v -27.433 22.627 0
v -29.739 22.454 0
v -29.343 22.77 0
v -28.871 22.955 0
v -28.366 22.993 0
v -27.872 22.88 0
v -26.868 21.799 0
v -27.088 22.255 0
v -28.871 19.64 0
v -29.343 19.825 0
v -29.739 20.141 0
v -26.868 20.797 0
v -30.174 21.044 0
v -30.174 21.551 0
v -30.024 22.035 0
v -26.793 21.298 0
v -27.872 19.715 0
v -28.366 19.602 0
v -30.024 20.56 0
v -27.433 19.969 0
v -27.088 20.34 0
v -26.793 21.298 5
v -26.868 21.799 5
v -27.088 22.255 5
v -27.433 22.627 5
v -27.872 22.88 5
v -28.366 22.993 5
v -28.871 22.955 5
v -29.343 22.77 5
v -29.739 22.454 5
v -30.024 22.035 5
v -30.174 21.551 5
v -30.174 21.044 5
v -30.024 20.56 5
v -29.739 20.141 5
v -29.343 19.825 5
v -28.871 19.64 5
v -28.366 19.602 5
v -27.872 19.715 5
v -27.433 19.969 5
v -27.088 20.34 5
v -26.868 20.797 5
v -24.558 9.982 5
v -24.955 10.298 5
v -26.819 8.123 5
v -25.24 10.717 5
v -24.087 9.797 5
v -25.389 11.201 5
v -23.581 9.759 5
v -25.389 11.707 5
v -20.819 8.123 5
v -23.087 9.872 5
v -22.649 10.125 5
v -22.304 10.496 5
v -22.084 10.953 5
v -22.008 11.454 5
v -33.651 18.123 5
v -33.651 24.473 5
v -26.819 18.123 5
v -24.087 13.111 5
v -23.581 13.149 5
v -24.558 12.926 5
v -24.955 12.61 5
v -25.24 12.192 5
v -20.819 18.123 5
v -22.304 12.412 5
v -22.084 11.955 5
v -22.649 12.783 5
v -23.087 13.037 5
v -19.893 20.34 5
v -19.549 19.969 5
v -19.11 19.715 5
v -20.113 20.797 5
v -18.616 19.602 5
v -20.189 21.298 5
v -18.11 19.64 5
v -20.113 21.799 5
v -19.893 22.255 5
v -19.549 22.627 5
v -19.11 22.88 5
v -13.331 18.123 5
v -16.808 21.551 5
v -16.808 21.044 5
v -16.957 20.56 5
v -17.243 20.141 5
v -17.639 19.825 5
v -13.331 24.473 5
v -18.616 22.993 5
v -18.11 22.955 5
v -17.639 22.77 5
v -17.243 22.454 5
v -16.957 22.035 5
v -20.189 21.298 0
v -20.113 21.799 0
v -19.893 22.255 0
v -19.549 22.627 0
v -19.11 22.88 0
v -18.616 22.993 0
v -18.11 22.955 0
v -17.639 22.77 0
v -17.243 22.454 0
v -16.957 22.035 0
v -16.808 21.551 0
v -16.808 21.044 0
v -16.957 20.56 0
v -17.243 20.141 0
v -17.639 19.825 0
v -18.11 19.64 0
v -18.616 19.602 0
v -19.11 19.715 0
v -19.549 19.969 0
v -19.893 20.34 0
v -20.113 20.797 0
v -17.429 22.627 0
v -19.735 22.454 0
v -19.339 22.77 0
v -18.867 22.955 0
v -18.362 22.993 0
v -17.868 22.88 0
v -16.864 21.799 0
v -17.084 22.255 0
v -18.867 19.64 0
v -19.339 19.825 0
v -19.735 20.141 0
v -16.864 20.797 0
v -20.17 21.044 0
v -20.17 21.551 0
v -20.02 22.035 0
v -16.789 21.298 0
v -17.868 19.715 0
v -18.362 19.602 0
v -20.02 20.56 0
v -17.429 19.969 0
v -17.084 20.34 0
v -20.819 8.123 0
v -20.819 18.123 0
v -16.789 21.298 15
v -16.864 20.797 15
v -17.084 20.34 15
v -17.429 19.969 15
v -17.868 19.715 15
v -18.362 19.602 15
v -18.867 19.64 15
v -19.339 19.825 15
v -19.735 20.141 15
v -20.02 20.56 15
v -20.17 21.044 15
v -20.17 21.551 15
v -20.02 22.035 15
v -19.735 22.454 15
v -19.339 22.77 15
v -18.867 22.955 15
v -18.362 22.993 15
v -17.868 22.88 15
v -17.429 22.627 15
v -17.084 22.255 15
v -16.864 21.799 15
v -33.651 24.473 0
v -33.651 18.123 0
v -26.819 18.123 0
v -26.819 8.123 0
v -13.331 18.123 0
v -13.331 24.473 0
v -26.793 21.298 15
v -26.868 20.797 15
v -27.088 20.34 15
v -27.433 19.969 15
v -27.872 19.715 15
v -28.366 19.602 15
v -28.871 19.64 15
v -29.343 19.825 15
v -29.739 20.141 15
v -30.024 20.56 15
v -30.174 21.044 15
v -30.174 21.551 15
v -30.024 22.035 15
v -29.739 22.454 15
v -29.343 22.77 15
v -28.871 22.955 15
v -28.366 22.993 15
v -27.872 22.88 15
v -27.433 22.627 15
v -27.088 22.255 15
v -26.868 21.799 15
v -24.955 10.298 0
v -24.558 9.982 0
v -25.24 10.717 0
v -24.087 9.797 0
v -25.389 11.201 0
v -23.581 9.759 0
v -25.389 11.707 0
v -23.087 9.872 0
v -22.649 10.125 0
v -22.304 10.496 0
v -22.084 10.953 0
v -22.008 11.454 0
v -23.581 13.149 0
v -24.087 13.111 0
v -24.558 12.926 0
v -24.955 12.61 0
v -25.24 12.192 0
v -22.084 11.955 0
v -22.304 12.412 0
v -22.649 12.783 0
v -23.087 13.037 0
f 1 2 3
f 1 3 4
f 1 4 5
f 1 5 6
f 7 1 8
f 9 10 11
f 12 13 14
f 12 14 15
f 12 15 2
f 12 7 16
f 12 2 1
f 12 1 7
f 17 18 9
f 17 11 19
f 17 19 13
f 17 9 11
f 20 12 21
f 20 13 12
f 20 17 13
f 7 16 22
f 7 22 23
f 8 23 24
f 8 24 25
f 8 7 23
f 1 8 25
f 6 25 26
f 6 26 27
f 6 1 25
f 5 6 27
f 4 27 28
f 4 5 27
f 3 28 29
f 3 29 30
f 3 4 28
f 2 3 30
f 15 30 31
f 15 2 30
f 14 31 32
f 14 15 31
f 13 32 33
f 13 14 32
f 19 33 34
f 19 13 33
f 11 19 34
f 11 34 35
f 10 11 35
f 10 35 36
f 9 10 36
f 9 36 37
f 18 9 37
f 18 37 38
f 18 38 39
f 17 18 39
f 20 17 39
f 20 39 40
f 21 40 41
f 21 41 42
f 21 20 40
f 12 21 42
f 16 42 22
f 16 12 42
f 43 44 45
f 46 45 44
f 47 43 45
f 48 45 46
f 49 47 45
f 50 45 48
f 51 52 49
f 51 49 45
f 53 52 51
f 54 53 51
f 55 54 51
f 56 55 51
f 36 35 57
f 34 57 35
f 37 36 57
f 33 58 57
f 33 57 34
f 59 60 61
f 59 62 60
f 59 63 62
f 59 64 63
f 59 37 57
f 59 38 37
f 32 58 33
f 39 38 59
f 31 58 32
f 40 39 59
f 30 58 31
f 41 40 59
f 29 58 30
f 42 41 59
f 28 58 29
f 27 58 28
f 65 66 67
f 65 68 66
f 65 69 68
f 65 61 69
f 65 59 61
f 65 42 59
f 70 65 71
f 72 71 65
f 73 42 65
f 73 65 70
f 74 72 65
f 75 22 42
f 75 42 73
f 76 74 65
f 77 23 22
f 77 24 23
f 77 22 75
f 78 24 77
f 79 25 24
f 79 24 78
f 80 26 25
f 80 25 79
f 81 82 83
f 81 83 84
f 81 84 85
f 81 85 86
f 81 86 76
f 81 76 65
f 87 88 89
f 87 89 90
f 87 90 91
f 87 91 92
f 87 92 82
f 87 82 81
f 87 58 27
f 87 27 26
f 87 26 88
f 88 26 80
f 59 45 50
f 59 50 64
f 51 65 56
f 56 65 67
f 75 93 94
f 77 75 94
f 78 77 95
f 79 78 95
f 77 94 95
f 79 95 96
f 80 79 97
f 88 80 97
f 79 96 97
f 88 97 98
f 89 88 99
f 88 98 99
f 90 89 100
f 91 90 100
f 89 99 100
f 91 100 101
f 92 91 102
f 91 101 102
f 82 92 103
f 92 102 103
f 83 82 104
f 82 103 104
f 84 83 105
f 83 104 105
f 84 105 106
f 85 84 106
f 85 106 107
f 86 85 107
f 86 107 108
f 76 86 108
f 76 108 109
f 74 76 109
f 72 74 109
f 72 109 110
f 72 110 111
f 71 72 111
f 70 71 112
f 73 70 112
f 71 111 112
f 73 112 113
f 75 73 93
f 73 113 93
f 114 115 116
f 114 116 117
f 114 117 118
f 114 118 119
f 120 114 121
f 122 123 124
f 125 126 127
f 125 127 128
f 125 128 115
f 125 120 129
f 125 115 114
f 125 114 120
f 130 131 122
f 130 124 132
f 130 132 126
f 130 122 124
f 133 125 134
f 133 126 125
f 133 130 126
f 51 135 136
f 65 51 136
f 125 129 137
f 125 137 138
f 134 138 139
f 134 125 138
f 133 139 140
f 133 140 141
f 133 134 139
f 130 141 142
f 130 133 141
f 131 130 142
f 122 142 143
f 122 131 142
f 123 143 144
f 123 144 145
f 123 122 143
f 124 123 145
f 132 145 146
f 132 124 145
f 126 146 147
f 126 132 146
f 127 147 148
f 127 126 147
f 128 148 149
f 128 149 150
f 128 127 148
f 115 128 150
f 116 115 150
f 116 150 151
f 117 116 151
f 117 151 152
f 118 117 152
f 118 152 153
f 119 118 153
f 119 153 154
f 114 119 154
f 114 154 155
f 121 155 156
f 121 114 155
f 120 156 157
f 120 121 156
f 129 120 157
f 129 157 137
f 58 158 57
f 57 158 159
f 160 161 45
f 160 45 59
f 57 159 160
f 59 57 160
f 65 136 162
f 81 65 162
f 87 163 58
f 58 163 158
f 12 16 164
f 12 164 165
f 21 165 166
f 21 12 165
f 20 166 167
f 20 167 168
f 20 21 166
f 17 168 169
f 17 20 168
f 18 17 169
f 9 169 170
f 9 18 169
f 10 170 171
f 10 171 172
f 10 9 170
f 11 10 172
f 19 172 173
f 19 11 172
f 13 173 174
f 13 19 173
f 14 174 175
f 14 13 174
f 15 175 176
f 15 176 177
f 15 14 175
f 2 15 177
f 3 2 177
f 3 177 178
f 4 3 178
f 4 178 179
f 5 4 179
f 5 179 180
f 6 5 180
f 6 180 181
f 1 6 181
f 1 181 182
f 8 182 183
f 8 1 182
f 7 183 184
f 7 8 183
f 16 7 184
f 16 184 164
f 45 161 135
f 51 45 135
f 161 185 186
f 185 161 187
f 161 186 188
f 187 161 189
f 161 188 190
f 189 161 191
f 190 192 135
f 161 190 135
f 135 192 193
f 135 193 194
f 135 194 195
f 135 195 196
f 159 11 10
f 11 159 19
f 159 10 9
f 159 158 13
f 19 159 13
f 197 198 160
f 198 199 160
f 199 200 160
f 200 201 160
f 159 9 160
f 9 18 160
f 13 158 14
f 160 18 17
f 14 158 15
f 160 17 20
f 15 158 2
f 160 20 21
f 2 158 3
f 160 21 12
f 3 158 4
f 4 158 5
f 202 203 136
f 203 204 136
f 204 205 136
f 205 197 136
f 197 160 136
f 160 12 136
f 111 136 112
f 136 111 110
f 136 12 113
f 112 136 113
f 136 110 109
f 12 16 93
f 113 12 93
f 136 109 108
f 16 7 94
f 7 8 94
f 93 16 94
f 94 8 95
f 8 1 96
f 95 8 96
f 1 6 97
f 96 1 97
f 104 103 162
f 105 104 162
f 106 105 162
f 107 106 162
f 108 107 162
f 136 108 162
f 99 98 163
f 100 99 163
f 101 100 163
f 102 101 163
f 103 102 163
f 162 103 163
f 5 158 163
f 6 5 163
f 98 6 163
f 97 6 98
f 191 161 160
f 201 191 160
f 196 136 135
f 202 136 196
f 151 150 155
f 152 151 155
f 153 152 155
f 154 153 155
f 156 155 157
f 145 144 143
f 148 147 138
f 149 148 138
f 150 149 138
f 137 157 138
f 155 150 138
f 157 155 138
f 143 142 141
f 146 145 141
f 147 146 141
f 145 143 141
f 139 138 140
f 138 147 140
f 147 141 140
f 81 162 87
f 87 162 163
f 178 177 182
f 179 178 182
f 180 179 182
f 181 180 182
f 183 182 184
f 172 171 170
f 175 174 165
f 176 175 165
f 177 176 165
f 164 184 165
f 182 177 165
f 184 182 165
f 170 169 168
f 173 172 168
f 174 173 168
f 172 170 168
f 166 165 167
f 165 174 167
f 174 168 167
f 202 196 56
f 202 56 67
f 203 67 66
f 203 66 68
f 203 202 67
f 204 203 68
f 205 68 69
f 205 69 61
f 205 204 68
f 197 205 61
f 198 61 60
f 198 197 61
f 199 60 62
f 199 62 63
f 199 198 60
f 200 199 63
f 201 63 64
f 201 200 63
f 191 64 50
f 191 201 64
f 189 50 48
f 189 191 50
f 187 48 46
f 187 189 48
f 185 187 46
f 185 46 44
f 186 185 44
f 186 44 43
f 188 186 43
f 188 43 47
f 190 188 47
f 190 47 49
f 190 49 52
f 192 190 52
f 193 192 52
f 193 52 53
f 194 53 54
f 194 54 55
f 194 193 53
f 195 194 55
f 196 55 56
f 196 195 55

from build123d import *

# Parameters (mm, degrees)
F0_R     = 1.7
F0_W     = 6
F0_H     = 10
F1_DEPTH = 5
F2_R     = 1.7
F3_DEPTH = 15
F4_R     = 1.7
F5_DEPTH = 15


with BuildPart() as f1:
    # F0 (on Top) → F1 (new body)
    with BuildSketch(Plane.XY):
        Polygon((-13.330769, 18.122626), (-13.330769, 24.472626), (-33.650769, 24.472626), (-33.650769, 18.122626), (-26.818978, 18.122626), (-20.818978, 18.122626), align=None)
        with Locations((-28.492769, 21.297626)):
            Circle(F0_R, mode=Mode.SUBTRACT)
        with BuildLine():
            ThreePointArc((-16.788769, 21.297626), (-18.488769, 19.597626), (-20.188769, 21.297626))
            ThreePointArc((-20.188769, 21.297626), (-18.488769, 22.997626), (-16.788769, 21.297626))
        make_face(mode=Mode.SUBTRACT)
        with Locations((-23.818978, 13.122626)):
            Rectangle(F0_W, F0_H)
        with Locations((-23.708439, 11.454114)):
            Circle(F0_R, mode=Mode.SUBTRACT)
    extrude(amount=F1_DEPTH)


with BuildPart() as f3:
    # F2 (on face) → F3 (new body)
    with BuildSketch(Plane(origin=(0, 0, 0), x_dir=(1, 0, 0), z_dir=(0, 0, -1))):
        with Locations((-28.492769, -21.297626)):
            Circle(F2_R)
    extrude(amount=-F3_DEPTH)


with BuildPart() as f5:
    # F4 (on face) → F5 (new body)
    with BuildSketch(Plane(origin=(0, 0, 0), x_dir=(1, 0, 0), z_dir=(0, 0, -1))):
        with Locations((-18.488769, -21.297626)):
            Circle(F4_R)
    extrude(amount=-F5_DEPTH)


solid = Compound([f1.part, f3.part, f5.part])
